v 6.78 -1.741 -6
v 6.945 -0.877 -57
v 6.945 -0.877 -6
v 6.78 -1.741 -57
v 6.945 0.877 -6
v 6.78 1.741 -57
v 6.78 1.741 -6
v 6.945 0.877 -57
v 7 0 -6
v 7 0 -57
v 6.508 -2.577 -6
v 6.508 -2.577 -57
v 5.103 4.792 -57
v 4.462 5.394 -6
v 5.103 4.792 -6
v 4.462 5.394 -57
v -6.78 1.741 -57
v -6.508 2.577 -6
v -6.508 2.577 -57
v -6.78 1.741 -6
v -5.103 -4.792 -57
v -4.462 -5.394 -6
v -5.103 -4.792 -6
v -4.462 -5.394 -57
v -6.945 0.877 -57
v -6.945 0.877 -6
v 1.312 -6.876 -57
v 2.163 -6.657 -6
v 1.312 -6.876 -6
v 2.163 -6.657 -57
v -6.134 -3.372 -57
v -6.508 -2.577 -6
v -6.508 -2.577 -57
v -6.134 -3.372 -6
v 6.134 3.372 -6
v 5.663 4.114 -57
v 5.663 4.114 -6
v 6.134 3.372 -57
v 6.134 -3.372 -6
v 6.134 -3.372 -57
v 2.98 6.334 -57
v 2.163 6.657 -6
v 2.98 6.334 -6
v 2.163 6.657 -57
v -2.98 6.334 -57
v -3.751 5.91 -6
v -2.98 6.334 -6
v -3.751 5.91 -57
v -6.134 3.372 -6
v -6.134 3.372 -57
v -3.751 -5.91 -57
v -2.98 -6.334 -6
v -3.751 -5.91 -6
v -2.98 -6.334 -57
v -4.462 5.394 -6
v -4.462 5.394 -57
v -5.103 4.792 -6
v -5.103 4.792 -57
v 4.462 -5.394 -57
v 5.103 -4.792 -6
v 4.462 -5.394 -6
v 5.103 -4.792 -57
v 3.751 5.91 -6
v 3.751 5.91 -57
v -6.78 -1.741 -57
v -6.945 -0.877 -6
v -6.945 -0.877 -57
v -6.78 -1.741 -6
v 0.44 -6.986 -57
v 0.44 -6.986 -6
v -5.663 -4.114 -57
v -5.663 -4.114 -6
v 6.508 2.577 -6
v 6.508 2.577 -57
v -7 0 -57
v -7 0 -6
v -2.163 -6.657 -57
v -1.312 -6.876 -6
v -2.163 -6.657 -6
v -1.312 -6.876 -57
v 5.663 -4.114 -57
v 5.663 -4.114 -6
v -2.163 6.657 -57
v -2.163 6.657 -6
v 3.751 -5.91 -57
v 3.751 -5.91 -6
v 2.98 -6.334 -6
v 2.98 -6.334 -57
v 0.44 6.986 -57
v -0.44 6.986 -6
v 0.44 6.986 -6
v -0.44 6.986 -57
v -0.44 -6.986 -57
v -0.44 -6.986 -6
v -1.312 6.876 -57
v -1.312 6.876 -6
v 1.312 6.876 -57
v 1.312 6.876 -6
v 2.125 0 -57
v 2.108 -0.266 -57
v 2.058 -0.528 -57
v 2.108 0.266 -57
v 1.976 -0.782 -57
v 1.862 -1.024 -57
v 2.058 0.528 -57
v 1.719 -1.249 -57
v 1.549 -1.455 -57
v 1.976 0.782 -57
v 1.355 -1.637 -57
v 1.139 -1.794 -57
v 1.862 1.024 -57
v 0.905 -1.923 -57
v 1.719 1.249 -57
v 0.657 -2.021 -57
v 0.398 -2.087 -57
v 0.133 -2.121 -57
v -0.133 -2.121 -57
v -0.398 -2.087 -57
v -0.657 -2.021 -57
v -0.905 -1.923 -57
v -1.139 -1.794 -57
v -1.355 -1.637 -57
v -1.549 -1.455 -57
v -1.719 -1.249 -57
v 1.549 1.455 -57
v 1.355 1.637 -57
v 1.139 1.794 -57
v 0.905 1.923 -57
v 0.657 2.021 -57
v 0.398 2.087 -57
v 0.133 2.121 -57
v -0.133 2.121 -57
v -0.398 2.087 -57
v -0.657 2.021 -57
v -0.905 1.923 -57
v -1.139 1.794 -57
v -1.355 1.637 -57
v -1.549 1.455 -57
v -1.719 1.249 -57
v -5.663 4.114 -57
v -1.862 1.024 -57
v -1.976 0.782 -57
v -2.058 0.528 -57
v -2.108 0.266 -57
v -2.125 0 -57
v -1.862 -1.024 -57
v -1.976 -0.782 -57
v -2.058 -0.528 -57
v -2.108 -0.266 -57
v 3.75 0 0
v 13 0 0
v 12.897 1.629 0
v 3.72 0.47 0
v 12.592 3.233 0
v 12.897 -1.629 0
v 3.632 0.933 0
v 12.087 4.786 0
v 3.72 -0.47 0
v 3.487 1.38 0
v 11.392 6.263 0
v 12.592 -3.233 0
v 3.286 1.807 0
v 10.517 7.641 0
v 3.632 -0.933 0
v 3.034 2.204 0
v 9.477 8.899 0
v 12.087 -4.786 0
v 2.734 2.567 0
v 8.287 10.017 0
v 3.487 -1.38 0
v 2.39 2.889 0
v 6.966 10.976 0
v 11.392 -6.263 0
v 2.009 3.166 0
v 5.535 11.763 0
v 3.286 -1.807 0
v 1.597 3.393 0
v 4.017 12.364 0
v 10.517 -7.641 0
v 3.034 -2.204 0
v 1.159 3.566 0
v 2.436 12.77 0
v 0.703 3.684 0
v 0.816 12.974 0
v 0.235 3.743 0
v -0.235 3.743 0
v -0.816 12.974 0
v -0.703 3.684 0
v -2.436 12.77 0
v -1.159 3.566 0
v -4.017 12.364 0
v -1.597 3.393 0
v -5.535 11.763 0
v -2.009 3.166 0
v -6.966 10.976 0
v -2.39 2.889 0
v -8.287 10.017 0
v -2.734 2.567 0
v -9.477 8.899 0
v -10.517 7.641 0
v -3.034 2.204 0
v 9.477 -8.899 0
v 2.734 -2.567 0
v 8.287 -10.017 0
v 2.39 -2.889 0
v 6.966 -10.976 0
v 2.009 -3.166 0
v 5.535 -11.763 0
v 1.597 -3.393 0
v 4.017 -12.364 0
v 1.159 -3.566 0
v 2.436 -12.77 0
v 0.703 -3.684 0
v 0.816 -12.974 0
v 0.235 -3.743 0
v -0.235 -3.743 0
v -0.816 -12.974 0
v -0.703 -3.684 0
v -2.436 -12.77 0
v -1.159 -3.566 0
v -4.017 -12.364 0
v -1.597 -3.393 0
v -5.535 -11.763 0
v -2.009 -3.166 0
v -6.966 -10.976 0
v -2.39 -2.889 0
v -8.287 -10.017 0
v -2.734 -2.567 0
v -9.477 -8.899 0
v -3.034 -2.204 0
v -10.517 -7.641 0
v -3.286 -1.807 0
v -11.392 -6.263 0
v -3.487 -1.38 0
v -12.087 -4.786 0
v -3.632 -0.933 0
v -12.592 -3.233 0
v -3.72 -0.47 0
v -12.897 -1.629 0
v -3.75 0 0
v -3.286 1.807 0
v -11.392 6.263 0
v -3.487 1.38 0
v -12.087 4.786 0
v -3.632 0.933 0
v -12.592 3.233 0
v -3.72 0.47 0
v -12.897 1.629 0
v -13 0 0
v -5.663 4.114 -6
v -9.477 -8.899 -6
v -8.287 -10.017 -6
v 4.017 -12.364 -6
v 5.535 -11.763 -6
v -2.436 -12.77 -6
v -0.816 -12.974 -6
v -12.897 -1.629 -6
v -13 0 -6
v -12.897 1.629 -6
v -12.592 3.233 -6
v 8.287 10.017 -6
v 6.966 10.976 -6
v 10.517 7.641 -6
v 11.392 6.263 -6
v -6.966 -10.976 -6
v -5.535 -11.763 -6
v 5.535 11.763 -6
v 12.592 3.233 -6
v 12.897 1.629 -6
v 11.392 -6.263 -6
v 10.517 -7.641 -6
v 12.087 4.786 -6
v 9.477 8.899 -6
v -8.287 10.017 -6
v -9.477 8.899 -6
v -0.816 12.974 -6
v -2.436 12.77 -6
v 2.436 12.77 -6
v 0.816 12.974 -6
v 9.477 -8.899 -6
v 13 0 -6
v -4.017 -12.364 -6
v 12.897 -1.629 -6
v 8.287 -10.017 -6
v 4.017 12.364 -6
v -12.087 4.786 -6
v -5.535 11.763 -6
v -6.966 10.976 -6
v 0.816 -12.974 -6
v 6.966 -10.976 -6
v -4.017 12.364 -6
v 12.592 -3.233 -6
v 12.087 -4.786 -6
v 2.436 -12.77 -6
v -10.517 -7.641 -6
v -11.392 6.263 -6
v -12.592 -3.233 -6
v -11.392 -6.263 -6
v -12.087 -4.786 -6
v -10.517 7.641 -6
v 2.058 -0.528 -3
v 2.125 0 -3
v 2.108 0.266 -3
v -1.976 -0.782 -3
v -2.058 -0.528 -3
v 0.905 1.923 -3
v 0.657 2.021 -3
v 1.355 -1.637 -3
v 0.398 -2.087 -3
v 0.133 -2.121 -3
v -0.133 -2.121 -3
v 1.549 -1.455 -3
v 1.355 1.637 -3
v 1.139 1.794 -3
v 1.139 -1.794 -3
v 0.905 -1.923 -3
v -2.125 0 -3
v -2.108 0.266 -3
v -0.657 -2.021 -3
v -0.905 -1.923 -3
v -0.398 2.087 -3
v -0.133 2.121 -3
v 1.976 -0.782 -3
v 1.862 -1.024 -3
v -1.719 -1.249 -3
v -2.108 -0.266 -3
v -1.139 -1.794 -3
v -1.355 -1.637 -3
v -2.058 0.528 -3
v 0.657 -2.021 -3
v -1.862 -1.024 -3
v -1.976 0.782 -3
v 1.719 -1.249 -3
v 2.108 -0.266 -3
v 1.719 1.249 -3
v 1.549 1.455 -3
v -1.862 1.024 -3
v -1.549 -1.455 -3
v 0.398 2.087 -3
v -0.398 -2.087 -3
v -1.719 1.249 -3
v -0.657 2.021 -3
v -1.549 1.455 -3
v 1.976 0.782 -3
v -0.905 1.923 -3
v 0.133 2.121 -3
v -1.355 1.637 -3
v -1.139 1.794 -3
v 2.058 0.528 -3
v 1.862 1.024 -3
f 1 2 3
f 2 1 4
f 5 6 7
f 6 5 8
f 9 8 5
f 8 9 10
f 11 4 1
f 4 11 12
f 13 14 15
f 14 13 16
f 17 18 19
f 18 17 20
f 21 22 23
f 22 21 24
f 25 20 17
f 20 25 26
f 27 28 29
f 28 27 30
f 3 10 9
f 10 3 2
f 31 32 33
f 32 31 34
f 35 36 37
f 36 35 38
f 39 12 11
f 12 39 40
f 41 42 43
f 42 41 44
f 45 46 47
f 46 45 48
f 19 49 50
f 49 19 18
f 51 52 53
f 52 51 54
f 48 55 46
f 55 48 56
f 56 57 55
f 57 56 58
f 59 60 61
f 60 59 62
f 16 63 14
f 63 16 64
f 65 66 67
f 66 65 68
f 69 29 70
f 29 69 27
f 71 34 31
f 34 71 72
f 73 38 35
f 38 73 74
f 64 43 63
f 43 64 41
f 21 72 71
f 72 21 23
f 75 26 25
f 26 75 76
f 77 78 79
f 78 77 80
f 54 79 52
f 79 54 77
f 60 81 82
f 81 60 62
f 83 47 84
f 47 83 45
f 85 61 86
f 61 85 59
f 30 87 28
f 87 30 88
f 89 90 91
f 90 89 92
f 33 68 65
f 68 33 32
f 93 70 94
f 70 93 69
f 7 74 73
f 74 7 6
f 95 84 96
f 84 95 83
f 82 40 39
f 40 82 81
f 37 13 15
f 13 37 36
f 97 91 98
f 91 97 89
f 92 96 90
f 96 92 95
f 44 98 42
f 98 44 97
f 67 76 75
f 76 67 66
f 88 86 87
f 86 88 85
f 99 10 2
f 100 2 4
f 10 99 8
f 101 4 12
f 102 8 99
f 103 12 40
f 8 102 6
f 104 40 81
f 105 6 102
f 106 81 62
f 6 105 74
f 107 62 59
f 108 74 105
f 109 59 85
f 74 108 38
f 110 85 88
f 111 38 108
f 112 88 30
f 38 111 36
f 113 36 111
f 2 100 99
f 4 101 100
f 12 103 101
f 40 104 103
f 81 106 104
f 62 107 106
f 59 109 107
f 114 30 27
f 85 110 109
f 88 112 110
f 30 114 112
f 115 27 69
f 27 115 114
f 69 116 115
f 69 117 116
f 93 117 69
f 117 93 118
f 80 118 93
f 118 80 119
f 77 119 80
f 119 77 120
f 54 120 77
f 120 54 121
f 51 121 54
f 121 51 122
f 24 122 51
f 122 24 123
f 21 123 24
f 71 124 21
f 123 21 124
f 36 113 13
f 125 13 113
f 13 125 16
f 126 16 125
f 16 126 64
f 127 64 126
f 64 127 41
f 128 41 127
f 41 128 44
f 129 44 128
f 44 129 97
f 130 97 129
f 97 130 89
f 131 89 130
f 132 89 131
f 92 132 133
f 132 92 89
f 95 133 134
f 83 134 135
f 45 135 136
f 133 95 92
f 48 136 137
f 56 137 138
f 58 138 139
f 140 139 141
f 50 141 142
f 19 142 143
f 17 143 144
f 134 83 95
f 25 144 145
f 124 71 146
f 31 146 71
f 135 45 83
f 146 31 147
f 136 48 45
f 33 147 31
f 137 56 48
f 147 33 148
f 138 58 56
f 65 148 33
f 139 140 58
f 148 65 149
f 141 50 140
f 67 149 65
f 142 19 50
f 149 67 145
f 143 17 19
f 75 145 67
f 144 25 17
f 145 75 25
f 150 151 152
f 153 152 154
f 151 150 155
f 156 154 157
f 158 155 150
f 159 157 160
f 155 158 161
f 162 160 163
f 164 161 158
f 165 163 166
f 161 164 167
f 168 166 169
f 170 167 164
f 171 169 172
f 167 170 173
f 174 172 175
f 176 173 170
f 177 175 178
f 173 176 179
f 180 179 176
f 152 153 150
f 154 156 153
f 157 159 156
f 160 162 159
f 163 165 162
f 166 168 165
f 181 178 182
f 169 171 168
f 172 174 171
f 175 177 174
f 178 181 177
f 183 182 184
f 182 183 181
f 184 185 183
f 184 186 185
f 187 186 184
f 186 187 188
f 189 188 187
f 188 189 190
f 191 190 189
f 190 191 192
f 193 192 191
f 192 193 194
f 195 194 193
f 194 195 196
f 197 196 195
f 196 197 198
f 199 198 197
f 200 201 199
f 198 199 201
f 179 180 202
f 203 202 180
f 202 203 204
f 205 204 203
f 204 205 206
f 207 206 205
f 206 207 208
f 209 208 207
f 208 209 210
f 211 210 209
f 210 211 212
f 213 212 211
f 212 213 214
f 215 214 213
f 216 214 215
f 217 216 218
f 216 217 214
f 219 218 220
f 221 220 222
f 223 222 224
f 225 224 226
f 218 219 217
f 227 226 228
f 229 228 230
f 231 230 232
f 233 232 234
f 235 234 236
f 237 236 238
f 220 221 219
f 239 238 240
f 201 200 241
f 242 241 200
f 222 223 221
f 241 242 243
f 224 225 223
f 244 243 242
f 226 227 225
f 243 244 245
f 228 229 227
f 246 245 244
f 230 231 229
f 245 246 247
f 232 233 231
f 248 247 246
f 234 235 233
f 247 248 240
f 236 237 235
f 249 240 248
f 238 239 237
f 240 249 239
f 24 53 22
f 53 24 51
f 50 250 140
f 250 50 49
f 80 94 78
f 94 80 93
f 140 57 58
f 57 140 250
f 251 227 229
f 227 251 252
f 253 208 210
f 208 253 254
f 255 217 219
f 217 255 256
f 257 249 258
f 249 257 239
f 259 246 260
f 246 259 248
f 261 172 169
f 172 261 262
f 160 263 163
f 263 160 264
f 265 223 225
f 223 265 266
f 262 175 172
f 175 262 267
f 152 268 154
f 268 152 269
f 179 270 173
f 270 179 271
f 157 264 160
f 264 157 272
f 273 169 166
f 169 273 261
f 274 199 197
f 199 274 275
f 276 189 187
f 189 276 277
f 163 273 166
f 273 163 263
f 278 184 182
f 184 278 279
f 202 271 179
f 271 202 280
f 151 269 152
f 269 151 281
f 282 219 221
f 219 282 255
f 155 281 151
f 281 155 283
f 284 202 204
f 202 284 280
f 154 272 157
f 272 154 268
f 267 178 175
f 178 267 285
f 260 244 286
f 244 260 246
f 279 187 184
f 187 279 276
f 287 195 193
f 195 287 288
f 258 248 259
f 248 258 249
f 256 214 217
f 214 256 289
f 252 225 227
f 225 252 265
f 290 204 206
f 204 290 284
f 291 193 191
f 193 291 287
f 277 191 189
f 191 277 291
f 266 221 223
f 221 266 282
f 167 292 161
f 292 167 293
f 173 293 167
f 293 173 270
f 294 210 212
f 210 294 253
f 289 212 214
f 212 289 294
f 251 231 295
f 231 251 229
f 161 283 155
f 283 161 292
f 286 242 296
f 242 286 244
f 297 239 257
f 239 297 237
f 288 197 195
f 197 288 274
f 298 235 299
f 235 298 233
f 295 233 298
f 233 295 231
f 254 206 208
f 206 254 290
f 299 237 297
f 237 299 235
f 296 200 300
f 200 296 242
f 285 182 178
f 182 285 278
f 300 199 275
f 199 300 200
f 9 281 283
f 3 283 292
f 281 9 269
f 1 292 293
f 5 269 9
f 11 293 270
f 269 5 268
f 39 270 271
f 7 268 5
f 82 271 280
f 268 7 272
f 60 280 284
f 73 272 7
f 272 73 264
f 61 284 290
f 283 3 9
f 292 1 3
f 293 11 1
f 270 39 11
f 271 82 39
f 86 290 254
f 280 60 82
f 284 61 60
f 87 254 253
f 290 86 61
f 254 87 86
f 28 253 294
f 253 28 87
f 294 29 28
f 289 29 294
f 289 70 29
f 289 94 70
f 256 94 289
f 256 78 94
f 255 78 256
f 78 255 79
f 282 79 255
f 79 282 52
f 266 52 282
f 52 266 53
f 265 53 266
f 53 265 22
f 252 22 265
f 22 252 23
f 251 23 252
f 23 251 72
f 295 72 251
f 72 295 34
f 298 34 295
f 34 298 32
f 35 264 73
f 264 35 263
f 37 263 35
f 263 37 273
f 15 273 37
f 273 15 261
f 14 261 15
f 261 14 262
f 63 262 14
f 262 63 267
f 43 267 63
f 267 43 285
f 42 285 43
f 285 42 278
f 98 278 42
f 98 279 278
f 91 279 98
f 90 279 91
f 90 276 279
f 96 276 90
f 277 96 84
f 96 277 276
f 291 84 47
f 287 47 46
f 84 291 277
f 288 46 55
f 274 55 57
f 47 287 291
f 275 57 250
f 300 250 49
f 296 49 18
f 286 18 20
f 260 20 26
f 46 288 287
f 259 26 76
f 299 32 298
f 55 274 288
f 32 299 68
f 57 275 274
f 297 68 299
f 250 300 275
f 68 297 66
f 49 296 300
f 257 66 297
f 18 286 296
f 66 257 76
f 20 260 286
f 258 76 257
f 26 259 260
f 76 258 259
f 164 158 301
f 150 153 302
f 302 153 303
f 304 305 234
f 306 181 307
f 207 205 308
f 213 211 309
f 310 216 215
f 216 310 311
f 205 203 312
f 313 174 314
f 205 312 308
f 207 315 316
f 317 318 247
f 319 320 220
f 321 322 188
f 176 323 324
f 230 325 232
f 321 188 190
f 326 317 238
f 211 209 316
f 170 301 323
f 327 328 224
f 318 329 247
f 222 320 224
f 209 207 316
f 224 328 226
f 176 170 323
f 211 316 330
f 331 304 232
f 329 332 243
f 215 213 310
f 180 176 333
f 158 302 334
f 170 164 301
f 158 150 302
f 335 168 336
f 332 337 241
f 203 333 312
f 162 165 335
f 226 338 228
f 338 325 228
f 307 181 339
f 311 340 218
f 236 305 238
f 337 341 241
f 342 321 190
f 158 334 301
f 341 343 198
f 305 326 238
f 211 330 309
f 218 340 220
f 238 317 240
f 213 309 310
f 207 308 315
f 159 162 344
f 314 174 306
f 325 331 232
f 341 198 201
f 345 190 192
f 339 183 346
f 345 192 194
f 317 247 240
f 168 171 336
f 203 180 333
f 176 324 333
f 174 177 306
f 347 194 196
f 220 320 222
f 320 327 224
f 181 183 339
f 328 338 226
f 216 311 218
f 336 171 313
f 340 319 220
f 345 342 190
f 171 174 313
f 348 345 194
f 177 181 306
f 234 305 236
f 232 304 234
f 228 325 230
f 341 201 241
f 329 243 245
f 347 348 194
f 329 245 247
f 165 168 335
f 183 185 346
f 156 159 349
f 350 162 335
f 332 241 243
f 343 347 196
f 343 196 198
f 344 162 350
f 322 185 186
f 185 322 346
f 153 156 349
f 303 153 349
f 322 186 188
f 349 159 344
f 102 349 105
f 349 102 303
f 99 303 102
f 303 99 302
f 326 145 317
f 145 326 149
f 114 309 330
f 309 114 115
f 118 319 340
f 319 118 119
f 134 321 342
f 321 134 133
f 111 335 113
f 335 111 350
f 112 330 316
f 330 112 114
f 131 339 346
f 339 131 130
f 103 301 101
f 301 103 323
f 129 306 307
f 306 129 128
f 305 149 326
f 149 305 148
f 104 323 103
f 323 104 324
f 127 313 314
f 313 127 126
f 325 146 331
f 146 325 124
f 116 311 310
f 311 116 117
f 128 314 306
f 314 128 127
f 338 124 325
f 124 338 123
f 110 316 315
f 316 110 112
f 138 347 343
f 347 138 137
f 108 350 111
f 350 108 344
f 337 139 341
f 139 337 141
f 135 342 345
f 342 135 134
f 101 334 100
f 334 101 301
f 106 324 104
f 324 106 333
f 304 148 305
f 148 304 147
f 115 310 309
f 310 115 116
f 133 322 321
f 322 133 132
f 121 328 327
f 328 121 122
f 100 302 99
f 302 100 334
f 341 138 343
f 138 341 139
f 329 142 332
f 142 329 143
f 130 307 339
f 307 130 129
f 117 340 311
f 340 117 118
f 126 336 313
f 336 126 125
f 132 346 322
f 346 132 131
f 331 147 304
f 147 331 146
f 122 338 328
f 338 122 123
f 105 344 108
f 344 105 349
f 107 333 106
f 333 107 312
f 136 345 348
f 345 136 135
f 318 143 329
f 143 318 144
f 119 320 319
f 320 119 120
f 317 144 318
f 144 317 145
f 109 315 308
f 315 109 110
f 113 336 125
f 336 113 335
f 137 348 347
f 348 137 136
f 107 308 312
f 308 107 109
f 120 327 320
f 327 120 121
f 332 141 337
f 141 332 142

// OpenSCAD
$fn = 50;


difference() {
	union() {
		translate(v = [0, 0, -57.0000000000]) {
			cylinder(h = 57, r = 7.0000000000);
		}
		translate(v = [0, 0, -6.0000000000]) {
			cylinder(h = 6, r = 13.0000000000);
		}
	}
	union() {
		translate(v = [0, 0, 0]) {
			rotate(a = [0, 0, 0]) {
				difference() {
					union() {
						#translate(v = [0, 0, -57.0000000000]) {
							cylinder(h = 57, r = 2.0000000000);
						}
						#translate(v = [0, 0, -3]) {
							cylinder(h = 3, r = 7.0000000000, r1 = 2.1250000000, r2 = 3.7500000000);
						}
						#translate(v = [0, 0, -57.0000000000]) {
							cylinder(h = 57, r = 2.1250000000);
						}
						#translate(v = [0, 0, -57.0000000000]) {
							cylinder(h = 57, r = 2.0000000000);
						}
					}
					union();
				}
			}
		}
	}
}
